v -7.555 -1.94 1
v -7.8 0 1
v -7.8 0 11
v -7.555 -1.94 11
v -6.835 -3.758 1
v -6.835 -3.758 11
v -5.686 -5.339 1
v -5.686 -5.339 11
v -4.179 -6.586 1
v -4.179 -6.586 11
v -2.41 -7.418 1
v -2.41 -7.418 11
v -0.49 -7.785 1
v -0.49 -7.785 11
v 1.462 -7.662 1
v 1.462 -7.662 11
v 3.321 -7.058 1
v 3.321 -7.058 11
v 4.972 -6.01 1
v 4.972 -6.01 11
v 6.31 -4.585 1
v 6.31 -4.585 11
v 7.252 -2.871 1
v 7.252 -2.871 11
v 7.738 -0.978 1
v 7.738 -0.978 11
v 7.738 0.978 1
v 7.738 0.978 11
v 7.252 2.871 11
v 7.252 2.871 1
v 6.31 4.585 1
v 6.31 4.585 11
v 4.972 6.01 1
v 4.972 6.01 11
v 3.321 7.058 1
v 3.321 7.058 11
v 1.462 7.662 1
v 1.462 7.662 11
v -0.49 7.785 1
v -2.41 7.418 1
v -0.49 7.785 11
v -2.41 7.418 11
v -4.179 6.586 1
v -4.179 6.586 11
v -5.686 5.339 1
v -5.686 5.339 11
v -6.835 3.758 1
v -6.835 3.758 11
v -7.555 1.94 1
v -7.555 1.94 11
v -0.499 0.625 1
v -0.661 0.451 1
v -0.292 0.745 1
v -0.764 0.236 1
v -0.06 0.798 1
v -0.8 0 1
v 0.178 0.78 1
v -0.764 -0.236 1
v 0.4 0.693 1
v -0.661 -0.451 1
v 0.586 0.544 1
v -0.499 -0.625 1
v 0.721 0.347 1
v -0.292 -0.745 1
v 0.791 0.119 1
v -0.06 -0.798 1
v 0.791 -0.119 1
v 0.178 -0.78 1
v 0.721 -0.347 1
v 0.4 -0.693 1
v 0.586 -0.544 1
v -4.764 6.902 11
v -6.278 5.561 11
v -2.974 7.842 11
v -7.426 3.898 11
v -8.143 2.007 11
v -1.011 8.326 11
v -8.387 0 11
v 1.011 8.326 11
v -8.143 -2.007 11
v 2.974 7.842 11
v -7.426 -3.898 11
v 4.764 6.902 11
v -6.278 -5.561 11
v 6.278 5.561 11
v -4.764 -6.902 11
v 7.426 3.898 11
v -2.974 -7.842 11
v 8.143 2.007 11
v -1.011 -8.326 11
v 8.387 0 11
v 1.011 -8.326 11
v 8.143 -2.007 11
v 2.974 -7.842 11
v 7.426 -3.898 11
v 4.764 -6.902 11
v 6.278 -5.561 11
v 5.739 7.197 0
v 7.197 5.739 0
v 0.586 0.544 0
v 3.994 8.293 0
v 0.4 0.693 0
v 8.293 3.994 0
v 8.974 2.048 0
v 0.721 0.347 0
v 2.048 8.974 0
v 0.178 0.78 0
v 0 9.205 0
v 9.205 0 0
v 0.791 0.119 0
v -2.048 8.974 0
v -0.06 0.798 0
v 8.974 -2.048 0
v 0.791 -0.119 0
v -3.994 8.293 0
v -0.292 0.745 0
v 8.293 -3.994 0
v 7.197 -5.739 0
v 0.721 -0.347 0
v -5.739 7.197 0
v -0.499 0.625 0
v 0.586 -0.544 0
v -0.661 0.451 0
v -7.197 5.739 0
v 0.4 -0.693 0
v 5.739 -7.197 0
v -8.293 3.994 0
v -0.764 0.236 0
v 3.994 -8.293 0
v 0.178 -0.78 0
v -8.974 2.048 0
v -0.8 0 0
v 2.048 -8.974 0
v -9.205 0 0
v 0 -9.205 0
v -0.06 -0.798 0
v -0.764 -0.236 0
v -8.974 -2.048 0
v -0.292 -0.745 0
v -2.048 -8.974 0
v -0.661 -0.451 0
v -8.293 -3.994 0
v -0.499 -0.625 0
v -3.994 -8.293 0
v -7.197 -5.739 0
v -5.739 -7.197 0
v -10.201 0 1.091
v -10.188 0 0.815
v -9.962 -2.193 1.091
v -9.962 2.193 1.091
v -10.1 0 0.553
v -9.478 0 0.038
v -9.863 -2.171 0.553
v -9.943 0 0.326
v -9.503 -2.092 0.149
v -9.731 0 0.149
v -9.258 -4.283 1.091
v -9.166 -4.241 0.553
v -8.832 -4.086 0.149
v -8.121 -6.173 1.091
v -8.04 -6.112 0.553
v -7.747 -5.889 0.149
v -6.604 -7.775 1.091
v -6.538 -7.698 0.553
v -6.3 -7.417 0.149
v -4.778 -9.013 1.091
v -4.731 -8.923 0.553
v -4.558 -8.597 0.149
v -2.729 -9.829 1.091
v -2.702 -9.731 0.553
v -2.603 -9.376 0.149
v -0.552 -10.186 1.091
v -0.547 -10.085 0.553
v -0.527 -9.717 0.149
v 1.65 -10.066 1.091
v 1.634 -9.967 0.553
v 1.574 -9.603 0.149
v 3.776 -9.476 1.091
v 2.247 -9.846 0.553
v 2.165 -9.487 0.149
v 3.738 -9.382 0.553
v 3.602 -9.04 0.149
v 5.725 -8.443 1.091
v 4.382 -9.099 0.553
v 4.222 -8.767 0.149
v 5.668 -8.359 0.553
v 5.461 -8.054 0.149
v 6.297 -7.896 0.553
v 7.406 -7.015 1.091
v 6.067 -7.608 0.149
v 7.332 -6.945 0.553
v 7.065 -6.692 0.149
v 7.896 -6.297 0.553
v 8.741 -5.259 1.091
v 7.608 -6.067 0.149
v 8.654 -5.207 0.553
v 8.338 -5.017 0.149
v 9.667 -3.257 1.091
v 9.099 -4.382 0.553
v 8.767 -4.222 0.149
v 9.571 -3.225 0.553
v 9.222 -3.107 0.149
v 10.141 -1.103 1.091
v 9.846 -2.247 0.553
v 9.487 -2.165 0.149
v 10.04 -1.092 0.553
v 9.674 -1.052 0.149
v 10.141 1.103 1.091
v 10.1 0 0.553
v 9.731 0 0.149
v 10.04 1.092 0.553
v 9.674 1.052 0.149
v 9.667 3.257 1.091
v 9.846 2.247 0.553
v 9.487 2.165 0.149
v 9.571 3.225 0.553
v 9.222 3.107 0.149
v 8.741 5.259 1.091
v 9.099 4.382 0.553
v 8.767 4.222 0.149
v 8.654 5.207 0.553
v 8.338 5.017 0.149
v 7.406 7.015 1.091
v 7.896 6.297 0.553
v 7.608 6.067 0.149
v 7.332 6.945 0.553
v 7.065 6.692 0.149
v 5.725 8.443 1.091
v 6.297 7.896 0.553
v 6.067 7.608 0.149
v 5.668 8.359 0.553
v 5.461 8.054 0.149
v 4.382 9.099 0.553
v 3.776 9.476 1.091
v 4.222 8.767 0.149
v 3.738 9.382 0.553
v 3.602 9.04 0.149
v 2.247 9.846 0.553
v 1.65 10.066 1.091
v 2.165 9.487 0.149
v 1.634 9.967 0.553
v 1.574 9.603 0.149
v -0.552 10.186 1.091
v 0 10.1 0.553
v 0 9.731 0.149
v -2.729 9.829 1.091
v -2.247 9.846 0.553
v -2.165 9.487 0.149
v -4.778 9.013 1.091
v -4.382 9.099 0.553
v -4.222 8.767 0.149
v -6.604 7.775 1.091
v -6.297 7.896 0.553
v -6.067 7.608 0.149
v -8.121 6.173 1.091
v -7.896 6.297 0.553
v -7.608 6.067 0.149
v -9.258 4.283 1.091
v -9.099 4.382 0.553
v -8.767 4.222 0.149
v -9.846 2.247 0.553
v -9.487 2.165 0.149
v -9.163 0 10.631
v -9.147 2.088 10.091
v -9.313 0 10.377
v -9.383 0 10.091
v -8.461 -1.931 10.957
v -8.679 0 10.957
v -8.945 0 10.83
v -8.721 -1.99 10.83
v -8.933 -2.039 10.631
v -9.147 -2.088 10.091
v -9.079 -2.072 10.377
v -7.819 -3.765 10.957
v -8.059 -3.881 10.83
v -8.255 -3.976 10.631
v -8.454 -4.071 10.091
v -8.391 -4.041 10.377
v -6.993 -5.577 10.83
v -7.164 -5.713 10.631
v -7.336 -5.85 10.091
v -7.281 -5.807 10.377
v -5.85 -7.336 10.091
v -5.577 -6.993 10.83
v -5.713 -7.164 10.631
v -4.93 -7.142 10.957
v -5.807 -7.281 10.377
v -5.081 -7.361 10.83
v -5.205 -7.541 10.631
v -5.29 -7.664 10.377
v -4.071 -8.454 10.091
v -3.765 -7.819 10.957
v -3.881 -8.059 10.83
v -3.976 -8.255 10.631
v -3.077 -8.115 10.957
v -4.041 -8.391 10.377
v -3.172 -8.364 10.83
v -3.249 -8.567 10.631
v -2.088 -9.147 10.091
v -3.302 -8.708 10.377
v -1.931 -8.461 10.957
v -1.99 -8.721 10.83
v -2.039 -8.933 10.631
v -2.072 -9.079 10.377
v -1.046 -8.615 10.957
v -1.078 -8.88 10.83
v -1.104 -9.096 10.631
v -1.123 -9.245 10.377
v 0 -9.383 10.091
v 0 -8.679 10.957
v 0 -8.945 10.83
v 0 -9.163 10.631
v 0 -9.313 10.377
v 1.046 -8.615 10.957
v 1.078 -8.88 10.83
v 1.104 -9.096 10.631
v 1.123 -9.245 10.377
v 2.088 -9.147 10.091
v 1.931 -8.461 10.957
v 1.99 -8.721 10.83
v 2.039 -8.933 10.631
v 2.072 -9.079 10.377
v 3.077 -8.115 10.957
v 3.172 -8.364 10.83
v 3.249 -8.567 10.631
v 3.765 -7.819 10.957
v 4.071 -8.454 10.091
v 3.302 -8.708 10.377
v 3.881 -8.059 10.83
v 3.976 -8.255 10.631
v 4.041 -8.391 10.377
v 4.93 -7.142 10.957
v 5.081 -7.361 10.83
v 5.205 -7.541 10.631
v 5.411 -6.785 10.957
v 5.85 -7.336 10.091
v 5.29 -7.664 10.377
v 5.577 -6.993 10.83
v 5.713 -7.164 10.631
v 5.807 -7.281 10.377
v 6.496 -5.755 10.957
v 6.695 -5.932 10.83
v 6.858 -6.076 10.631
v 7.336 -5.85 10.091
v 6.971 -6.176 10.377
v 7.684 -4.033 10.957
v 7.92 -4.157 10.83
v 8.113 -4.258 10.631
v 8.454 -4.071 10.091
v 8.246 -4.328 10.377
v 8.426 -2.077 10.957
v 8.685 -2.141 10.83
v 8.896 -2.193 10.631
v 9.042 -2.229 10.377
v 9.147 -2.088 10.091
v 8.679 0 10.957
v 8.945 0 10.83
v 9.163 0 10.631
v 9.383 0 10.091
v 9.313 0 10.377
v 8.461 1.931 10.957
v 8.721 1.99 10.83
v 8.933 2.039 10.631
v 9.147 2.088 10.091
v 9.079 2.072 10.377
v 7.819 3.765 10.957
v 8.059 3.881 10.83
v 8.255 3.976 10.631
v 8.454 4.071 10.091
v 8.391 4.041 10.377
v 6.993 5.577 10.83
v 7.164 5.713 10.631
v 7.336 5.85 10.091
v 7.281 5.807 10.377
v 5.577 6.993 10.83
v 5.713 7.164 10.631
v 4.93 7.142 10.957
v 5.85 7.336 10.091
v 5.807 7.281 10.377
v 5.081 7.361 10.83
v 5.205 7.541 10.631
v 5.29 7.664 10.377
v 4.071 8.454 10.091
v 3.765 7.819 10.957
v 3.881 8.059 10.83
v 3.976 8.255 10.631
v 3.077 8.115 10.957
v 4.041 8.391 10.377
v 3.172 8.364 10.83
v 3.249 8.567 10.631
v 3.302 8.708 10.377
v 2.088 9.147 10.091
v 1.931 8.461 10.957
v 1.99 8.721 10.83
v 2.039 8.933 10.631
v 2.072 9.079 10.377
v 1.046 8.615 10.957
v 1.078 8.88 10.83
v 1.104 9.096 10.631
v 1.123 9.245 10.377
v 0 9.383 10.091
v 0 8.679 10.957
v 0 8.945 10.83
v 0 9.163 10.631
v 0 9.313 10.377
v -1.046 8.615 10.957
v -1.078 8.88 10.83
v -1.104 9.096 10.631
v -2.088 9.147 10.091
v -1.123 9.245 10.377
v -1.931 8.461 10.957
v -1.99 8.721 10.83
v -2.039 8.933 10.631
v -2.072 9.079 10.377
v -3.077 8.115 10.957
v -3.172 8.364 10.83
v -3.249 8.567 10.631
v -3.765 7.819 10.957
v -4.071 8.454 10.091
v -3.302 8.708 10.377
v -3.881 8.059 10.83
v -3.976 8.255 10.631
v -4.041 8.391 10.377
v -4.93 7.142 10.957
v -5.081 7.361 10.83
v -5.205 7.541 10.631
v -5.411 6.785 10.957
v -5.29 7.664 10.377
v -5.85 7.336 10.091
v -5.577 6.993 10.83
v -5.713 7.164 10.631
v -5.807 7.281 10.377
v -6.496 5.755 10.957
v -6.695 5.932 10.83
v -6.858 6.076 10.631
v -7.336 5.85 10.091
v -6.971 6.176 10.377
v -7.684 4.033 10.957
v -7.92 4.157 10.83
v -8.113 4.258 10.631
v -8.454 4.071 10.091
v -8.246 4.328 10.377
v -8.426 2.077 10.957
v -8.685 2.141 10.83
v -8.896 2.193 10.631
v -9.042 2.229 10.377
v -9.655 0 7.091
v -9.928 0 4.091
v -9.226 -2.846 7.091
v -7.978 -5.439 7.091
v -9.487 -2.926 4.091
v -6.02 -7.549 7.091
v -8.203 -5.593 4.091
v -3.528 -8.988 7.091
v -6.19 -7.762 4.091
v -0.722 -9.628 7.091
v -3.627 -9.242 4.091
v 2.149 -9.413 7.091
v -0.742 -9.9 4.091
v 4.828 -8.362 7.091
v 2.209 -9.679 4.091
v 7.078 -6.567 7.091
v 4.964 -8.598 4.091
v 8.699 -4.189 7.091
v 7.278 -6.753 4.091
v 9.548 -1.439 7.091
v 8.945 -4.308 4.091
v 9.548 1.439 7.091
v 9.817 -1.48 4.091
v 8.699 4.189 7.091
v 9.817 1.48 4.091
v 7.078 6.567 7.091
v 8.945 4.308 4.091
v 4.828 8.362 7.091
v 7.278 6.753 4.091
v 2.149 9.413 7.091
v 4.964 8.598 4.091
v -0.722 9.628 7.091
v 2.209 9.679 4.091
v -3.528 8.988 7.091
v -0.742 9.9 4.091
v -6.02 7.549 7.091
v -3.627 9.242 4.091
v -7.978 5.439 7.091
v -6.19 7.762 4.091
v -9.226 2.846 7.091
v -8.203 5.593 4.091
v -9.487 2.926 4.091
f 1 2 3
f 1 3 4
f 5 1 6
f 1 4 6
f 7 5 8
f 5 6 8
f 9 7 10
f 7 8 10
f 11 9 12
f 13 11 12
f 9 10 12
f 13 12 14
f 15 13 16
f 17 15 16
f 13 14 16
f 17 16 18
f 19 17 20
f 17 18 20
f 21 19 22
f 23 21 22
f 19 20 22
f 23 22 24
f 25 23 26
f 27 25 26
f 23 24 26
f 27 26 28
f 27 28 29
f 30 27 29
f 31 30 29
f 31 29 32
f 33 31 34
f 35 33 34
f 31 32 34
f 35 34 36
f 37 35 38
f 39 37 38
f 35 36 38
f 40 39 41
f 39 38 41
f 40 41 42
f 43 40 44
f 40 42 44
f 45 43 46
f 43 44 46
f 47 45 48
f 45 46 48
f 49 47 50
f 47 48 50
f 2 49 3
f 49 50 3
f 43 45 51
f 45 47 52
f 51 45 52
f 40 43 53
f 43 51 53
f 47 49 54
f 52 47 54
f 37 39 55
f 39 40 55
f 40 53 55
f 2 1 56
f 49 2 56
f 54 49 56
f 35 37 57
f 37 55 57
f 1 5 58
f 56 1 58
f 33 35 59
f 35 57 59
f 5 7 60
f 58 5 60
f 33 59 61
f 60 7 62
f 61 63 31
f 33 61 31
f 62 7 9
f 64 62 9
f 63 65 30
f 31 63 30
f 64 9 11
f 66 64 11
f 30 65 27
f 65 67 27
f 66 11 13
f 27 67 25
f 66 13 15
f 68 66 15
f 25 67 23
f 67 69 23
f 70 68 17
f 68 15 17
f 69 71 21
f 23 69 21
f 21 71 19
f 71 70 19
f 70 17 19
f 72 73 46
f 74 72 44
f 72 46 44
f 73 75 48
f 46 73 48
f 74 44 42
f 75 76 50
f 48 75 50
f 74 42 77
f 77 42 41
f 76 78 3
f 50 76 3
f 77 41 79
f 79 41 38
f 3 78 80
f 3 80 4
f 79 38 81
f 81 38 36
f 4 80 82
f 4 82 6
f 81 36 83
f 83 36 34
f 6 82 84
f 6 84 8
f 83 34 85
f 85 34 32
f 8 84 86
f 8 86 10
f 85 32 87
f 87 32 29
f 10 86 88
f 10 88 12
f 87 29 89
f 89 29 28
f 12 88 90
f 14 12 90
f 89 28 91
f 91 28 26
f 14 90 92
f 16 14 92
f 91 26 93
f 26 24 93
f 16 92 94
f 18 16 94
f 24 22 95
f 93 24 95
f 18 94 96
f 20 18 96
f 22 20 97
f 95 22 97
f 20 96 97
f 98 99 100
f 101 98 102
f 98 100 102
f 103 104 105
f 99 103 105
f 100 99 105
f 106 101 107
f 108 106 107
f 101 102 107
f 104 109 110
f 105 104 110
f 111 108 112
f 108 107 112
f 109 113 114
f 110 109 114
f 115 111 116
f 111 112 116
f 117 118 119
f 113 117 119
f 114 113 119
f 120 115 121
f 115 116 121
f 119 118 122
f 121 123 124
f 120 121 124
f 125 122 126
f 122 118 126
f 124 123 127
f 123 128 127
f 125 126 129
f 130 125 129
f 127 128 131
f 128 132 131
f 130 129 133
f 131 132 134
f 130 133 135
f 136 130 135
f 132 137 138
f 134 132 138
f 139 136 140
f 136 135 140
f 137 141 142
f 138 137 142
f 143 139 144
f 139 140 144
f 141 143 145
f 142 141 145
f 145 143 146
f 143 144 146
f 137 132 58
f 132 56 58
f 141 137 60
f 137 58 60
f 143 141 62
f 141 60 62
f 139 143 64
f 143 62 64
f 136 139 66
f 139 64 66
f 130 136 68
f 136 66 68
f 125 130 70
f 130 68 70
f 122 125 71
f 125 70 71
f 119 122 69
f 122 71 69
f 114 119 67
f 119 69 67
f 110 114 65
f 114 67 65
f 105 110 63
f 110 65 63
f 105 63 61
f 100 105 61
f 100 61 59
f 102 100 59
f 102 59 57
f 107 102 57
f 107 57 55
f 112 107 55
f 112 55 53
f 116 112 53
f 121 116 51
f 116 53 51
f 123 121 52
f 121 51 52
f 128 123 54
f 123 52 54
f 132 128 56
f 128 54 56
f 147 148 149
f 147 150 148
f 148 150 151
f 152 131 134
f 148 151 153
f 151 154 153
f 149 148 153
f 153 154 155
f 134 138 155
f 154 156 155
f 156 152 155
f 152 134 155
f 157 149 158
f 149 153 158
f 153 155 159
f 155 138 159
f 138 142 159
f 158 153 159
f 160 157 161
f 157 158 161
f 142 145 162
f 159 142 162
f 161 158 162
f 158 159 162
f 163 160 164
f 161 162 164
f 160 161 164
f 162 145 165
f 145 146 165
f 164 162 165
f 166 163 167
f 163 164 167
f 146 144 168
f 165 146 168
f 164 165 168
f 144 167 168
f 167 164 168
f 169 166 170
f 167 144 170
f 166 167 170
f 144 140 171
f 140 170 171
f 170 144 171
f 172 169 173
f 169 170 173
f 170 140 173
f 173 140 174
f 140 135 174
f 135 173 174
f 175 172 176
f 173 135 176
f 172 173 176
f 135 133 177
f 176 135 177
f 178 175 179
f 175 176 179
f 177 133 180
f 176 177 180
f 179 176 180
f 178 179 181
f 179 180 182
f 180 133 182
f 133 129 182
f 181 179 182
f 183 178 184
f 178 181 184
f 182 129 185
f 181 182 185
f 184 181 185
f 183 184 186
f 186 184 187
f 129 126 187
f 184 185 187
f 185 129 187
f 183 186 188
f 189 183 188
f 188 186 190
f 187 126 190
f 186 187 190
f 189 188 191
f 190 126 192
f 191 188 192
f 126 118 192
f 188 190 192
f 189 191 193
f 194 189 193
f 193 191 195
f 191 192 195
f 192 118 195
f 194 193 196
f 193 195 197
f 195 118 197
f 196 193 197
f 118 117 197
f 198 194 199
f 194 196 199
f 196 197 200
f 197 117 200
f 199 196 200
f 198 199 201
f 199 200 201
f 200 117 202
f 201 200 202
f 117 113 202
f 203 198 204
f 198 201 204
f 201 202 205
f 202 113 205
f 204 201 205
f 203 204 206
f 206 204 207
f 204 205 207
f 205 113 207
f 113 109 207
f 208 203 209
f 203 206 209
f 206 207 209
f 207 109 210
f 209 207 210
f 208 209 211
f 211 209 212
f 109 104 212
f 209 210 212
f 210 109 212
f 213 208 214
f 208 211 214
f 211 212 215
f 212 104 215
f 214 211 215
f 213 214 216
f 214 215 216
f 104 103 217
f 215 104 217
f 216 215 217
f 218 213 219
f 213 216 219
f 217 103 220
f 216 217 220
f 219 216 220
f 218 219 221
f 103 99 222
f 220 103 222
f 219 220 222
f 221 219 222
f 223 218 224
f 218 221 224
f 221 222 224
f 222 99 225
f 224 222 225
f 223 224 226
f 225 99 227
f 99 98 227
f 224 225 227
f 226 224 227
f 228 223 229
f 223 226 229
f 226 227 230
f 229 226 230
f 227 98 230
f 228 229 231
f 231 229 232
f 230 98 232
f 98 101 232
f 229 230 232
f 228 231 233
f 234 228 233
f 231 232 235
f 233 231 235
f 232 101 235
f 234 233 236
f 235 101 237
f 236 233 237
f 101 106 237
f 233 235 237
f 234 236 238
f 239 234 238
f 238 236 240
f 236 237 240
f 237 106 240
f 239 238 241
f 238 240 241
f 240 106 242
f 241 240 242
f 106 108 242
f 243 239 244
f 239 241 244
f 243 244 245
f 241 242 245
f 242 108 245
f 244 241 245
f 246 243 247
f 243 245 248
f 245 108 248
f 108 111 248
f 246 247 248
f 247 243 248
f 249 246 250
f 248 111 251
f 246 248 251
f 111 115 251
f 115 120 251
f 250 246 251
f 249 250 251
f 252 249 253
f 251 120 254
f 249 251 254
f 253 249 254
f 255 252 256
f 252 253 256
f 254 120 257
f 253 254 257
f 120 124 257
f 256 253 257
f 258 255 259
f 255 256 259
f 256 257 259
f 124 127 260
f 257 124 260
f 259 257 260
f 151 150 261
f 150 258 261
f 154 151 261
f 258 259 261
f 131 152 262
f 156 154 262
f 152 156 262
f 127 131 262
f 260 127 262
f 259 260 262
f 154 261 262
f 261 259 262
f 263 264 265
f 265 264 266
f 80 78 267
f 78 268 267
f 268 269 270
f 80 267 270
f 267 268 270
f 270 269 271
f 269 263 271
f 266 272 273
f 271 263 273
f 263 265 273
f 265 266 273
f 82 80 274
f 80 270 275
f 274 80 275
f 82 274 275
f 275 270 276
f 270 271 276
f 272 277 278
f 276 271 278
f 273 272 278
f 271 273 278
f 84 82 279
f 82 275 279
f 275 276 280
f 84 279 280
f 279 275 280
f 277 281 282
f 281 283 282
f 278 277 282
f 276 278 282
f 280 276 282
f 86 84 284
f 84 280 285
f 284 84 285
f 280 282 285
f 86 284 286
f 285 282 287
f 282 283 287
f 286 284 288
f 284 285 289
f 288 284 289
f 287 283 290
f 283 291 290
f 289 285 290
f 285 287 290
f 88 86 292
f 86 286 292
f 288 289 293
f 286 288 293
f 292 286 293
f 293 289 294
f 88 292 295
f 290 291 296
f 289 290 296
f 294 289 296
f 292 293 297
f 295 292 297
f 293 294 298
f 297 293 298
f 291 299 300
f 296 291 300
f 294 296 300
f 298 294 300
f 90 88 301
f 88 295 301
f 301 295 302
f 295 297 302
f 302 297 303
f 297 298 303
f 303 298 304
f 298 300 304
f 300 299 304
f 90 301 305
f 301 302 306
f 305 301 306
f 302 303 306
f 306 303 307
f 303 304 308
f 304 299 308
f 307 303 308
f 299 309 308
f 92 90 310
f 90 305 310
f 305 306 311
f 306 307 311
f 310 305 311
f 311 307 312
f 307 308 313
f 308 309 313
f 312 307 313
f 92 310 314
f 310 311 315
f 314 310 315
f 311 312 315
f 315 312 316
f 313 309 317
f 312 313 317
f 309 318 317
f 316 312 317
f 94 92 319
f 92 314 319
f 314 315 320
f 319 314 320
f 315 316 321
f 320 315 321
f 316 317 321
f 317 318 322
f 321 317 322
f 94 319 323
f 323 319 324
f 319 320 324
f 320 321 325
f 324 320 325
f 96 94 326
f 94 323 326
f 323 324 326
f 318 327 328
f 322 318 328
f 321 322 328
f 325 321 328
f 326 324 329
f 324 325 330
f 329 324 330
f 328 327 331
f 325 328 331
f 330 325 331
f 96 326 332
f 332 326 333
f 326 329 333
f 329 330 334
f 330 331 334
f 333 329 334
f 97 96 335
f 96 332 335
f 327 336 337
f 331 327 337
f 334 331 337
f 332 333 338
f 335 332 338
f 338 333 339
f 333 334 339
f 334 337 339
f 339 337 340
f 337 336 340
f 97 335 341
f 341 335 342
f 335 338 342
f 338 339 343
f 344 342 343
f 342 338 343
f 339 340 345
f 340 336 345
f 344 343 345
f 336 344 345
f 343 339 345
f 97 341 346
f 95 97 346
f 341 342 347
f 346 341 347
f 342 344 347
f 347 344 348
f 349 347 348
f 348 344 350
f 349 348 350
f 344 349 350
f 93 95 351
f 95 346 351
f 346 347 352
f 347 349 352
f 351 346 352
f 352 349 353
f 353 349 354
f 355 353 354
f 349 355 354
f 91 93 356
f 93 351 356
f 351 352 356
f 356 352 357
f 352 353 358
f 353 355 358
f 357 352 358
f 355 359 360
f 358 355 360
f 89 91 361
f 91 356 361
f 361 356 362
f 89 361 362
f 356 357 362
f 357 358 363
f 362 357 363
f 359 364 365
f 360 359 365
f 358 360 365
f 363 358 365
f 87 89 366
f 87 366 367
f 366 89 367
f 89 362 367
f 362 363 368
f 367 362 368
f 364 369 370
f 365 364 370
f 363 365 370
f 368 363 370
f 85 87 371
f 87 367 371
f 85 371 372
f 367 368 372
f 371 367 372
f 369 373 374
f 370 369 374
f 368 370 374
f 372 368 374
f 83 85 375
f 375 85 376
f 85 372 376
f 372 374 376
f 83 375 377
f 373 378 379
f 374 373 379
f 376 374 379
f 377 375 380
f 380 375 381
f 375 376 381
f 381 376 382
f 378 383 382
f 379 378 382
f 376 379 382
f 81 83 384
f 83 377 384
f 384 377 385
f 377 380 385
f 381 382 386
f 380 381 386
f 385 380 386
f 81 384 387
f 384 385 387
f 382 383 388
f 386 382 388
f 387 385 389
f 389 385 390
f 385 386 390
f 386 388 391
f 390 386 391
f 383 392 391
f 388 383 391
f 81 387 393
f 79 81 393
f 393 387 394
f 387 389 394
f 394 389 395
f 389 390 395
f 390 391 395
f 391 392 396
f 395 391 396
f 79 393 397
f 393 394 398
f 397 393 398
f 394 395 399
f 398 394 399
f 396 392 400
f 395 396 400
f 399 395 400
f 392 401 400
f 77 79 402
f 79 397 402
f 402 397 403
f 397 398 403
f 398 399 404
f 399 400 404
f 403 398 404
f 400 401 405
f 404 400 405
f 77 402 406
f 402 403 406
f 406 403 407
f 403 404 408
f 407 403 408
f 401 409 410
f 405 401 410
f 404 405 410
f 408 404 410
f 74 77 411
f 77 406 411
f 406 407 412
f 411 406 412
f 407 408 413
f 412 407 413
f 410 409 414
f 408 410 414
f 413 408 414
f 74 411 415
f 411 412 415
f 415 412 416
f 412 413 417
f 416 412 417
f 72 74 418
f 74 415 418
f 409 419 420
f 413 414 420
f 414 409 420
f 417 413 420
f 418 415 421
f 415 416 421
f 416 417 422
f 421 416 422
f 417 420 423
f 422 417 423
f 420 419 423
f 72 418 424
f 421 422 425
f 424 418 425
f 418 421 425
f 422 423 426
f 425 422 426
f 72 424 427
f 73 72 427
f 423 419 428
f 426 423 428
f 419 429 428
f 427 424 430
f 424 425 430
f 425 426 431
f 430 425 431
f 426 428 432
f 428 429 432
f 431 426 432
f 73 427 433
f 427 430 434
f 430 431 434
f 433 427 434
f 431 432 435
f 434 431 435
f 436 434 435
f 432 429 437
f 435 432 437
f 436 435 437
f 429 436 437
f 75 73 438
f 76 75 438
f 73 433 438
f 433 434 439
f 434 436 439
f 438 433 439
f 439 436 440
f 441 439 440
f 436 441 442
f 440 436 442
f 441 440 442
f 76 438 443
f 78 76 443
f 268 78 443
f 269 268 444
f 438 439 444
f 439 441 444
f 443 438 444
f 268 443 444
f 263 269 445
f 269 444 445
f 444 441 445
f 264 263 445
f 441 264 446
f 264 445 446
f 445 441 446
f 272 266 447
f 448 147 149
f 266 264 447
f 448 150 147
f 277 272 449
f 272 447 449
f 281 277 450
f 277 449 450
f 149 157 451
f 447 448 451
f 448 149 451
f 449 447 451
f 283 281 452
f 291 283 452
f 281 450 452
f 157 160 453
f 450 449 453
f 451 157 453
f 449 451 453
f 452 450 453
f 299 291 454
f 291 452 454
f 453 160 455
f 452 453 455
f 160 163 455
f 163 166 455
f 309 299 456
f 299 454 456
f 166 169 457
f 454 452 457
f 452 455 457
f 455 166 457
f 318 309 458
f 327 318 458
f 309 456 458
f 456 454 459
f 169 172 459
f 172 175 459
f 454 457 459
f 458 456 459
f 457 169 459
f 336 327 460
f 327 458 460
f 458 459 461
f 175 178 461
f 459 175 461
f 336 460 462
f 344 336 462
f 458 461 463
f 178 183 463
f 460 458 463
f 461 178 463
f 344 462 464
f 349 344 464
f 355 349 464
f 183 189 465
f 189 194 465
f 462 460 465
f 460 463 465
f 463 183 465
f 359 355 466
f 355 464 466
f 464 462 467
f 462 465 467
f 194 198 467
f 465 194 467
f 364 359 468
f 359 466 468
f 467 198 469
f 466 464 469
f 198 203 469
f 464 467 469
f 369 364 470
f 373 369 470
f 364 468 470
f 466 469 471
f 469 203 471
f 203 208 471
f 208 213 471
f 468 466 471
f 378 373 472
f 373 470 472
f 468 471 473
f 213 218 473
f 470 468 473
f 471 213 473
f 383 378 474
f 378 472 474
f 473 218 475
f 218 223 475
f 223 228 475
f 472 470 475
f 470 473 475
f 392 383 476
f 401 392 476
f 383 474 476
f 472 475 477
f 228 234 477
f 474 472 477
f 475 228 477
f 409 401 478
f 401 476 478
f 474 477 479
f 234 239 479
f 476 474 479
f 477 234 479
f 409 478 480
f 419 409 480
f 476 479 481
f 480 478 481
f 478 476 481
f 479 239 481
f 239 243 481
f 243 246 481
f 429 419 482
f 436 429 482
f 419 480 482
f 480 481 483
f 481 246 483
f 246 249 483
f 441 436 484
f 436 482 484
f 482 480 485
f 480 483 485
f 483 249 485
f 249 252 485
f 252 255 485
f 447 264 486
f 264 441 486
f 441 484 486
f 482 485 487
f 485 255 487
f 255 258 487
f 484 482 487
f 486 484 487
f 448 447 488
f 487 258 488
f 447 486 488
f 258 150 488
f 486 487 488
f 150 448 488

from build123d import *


with BuildPart() as f1:
    # F0 (on Front) → F1 (revolve)
    with BuildSketch(Plane.XZ):
        with BuildLine():
            Line((-9.204967, 0), (-0.8, 0))
            Line((-0.8, 0), (-0.8, 1))
            Line((-0.8, 1), (-7.8, 1))
            Line((-7.8, 1), (-7.8, 11))
            Line((-7.8, 11), (-8.386785, 11))
            ThreePointArc((-8.386785, 11), (-9.061124, 10.738423), (-9.382679, 10.090536))
            Line((-9.382679, 10.090536), (-10.20086, 1.090536))
            ThreePointArc((-10.20086, 1.090536), (-9.94339, 0.325662), (-9.204967, 0))
        make_face()
    revolve(axis=Axis((0, 0, 1.31524), (0, 0, 1)))


solid = f1.part
